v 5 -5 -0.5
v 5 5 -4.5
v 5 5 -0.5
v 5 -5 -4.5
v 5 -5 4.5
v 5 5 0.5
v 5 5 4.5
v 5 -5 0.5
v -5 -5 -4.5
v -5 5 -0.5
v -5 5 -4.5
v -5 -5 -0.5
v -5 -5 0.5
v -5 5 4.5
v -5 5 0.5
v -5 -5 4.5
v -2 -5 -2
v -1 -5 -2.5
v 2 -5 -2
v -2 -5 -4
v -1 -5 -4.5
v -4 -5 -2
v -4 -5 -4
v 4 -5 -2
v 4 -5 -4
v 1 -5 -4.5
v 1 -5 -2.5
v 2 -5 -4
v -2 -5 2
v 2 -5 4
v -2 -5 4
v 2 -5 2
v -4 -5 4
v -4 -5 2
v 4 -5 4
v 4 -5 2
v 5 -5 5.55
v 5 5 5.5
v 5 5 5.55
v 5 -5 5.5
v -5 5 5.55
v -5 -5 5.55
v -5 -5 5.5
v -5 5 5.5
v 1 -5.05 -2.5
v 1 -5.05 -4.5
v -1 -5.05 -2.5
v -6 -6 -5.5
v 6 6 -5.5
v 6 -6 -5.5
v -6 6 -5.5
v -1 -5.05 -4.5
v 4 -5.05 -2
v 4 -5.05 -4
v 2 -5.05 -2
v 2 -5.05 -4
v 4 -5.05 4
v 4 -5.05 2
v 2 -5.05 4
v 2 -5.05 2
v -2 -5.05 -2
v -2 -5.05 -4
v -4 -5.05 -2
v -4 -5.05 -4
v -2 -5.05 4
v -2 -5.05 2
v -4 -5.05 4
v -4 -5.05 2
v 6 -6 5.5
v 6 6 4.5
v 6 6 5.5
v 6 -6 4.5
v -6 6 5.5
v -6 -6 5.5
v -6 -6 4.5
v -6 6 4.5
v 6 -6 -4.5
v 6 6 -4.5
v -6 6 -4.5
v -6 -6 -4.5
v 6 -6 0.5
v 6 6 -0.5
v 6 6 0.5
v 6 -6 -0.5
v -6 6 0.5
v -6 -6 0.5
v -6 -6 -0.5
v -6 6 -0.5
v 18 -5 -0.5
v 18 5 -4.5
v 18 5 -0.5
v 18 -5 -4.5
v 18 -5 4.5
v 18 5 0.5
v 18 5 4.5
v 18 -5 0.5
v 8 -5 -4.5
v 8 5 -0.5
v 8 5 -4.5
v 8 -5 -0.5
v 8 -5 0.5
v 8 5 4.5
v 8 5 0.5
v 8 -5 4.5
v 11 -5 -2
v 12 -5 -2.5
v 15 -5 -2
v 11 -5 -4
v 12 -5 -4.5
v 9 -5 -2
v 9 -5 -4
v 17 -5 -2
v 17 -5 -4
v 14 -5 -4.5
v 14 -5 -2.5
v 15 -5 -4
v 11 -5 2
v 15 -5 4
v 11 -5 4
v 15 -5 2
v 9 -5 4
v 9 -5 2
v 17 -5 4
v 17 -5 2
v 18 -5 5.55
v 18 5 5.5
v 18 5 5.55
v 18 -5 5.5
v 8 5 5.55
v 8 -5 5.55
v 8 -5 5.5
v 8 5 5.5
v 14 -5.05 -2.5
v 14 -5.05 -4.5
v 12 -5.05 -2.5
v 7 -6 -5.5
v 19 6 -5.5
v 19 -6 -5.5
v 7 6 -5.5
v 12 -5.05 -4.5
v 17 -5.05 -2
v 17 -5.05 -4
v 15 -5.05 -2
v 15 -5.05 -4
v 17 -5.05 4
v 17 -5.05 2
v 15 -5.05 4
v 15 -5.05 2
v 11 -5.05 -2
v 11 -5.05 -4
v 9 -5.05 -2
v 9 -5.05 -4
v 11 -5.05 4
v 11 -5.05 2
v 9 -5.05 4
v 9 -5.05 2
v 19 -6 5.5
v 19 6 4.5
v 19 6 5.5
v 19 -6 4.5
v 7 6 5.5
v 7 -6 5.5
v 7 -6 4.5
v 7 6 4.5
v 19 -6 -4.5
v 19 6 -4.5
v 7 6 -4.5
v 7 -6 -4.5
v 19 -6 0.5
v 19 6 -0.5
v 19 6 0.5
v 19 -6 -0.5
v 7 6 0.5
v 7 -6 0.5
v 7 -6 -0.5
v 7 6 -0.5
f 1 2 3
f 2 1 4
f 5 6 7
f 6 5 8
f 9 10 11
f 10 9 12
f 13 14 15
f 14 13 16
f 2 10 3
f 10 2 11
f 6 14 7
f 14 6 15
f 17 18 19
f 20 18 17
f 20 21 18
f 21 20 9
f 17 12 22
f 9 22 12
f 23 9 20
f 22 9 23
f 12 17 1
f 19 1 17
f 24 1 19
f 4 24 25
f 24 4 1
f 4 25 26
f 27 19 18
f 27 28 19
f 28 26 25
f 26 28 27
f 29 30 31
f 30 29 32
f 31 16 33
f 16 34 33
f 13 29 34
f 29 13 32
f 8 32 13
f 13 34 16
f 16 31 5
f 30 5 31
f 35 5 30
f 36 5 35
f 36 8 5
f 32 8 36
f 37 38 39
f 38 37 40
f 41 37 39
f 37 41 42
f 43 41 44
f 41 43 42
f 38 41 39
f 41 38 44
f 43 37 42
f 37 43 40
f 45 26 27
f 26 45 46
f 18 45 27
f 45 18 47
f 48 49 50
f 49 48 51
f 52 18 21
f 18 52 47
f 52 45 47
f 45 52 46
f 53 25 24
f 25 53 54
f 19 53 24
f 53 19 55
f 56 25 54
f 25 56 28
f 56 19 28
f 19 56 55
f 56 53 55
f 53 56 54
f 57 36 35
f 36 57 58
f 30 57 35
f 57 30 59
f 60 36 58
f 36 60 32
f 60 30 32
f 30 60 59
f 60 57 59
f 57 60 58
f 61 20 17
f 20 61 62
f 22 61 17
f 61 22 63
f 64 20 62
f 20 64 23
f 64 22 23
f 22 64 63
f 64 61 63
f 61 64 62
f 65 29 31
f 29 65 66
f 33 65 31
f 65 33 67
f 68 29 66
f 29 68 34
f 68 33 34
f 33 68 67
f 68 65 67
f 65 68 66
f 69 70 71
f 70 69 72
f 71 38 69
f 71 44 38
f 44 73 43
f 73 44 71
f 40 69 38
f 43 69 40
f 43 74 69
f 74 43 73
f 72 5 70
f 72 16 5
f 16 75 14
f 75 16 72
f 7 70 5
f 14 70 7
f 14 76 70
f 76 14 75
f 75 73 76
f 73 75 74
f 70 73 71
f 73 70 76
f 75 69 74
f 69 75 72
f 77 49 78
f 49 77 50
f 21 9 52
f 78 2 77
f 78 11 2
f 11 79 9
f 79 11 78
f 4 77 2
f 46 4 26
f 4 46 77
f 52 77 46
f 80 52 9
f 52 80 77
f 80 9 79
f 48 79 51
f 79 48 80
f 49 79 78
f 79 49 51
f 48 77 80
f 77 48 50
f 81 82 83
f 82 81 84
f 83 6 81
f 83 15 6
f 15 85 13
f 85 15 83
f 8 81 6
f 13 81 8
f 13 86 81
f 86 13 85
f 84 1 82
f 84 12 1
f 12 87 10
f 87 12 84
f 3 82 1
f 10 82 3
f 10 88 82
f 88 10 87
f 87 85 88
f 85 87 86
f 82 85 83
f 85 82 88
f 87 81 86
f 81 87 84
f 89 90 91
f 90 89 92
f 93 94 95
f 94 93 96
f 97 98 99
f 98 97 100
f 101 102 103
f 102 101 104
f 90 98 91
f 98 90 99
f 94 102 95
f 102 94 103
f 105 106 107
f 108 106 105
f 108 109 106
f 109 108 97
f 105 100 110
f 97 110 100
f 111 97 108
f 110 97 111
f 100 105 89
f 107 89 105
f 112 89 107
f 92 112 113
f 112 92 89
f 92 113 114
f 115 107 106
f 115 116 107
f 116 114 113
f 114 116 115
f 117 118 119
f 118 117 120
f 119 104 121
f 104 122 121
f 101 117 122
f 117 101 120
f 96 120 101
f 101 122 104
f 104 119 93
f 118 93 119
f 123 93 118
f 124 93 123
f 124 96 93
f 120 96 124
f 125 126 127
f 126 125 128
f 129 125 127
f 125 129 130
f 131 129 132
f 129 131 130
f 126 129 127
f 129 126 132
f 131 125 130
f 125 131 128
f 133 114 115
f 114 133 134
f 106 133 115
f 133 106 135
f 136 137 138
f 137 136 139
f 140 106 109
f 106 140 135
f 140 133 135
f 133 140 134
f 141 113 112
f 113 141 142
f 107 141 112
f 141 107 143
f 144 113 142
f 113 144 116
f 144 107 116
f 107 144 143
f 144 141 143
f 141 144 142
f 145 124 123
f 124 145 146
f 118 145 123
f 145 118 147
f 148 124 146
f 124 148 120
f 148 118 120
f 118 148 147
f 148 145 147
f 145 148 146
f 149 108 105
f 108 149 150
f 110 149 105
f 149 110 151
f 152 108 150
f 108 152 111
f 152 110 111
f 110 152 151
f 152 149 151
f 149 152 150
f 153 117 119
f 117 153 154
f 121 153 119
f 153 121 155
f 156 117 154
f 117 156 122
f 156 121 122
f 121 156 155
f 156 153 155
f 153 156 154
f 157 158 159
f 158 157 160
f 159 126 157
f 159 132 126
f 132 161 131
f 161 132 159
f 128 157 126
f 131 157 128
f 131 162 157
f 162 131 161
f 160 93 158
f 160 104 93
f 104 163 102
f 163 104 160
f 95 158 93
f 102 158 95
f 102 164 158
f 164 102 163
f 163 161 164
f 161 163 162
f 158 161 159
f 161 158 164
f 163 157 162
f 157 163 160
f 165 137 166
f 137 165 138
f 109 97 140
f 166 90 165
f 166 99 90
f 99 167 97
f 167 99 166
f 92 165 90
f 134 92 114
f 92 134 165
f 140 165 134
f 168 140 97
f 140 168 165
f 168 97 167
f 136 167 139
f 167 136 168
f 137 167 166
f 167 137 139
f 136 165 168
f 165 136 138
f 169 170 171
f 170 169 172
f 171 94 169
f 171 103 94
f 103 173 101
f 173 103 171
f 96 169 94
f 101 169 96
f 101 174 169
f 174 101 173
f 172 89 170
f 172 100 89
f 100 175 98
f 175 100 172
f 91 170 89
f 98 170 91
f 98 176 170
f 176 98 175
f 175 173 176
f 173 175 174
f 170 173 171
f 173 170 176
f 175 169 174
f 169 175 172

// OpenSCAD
// file: Building_02/Building_02.scad
module Building_02() {
 
    module door(door_size =[10,10,10] , coord =[0,0,0]){
      color("#a59f8b")
      translate([coord[0],coord[1],coord[2]])
      cube([door_size[0],door_size[1],door_size[2]], center= true);
    }
    
    
    union(){
    color("#132919")
    cube([10,10,10],center=true);
    
    
    translate([0,0,5.5])
    color("#d1c093")
    cube([10,10,0.1],center=true);
    
    // Doors
    color("#a59f8b")
    translate([0,-5,-4])
    cube([2,0.1,3],center=true);
    
    
    // Windows
    translate([3,-5,-3]){
    color("#9fcbd0")
    cube([2,0.1,2],center=true);
    }
    
    translate([3,-5,3]){
    color("#9fcbd0")
    cube([2,0.1,2],center=true);
    }
    
    translate([-3,-5,-3]){
    color("#9fcbd0")
    cube([2,0.1,2],center=true);
    }
    
    translate([-3,-5,3]){
    color("#9fcbd0")
    cube([2,0.1,2],center=true);
    }
     
    // Roof
    translate([0,0,5])
    color("#a59f8b")
    cube([12,12,1],center=true);
    
    translate([0,0,-5]){
    color("#a59f8b")
    cube([12,12,1],center=true);
    }
    
    translate([0,0,0]){
    color("#a59f8b")
    cube([12,12,1],center=true);
    }
    
    }
}


Building_02();
// main file
include <Building_02/Building_02.scad>

translate([13,0,0]){
Building_02();
}
